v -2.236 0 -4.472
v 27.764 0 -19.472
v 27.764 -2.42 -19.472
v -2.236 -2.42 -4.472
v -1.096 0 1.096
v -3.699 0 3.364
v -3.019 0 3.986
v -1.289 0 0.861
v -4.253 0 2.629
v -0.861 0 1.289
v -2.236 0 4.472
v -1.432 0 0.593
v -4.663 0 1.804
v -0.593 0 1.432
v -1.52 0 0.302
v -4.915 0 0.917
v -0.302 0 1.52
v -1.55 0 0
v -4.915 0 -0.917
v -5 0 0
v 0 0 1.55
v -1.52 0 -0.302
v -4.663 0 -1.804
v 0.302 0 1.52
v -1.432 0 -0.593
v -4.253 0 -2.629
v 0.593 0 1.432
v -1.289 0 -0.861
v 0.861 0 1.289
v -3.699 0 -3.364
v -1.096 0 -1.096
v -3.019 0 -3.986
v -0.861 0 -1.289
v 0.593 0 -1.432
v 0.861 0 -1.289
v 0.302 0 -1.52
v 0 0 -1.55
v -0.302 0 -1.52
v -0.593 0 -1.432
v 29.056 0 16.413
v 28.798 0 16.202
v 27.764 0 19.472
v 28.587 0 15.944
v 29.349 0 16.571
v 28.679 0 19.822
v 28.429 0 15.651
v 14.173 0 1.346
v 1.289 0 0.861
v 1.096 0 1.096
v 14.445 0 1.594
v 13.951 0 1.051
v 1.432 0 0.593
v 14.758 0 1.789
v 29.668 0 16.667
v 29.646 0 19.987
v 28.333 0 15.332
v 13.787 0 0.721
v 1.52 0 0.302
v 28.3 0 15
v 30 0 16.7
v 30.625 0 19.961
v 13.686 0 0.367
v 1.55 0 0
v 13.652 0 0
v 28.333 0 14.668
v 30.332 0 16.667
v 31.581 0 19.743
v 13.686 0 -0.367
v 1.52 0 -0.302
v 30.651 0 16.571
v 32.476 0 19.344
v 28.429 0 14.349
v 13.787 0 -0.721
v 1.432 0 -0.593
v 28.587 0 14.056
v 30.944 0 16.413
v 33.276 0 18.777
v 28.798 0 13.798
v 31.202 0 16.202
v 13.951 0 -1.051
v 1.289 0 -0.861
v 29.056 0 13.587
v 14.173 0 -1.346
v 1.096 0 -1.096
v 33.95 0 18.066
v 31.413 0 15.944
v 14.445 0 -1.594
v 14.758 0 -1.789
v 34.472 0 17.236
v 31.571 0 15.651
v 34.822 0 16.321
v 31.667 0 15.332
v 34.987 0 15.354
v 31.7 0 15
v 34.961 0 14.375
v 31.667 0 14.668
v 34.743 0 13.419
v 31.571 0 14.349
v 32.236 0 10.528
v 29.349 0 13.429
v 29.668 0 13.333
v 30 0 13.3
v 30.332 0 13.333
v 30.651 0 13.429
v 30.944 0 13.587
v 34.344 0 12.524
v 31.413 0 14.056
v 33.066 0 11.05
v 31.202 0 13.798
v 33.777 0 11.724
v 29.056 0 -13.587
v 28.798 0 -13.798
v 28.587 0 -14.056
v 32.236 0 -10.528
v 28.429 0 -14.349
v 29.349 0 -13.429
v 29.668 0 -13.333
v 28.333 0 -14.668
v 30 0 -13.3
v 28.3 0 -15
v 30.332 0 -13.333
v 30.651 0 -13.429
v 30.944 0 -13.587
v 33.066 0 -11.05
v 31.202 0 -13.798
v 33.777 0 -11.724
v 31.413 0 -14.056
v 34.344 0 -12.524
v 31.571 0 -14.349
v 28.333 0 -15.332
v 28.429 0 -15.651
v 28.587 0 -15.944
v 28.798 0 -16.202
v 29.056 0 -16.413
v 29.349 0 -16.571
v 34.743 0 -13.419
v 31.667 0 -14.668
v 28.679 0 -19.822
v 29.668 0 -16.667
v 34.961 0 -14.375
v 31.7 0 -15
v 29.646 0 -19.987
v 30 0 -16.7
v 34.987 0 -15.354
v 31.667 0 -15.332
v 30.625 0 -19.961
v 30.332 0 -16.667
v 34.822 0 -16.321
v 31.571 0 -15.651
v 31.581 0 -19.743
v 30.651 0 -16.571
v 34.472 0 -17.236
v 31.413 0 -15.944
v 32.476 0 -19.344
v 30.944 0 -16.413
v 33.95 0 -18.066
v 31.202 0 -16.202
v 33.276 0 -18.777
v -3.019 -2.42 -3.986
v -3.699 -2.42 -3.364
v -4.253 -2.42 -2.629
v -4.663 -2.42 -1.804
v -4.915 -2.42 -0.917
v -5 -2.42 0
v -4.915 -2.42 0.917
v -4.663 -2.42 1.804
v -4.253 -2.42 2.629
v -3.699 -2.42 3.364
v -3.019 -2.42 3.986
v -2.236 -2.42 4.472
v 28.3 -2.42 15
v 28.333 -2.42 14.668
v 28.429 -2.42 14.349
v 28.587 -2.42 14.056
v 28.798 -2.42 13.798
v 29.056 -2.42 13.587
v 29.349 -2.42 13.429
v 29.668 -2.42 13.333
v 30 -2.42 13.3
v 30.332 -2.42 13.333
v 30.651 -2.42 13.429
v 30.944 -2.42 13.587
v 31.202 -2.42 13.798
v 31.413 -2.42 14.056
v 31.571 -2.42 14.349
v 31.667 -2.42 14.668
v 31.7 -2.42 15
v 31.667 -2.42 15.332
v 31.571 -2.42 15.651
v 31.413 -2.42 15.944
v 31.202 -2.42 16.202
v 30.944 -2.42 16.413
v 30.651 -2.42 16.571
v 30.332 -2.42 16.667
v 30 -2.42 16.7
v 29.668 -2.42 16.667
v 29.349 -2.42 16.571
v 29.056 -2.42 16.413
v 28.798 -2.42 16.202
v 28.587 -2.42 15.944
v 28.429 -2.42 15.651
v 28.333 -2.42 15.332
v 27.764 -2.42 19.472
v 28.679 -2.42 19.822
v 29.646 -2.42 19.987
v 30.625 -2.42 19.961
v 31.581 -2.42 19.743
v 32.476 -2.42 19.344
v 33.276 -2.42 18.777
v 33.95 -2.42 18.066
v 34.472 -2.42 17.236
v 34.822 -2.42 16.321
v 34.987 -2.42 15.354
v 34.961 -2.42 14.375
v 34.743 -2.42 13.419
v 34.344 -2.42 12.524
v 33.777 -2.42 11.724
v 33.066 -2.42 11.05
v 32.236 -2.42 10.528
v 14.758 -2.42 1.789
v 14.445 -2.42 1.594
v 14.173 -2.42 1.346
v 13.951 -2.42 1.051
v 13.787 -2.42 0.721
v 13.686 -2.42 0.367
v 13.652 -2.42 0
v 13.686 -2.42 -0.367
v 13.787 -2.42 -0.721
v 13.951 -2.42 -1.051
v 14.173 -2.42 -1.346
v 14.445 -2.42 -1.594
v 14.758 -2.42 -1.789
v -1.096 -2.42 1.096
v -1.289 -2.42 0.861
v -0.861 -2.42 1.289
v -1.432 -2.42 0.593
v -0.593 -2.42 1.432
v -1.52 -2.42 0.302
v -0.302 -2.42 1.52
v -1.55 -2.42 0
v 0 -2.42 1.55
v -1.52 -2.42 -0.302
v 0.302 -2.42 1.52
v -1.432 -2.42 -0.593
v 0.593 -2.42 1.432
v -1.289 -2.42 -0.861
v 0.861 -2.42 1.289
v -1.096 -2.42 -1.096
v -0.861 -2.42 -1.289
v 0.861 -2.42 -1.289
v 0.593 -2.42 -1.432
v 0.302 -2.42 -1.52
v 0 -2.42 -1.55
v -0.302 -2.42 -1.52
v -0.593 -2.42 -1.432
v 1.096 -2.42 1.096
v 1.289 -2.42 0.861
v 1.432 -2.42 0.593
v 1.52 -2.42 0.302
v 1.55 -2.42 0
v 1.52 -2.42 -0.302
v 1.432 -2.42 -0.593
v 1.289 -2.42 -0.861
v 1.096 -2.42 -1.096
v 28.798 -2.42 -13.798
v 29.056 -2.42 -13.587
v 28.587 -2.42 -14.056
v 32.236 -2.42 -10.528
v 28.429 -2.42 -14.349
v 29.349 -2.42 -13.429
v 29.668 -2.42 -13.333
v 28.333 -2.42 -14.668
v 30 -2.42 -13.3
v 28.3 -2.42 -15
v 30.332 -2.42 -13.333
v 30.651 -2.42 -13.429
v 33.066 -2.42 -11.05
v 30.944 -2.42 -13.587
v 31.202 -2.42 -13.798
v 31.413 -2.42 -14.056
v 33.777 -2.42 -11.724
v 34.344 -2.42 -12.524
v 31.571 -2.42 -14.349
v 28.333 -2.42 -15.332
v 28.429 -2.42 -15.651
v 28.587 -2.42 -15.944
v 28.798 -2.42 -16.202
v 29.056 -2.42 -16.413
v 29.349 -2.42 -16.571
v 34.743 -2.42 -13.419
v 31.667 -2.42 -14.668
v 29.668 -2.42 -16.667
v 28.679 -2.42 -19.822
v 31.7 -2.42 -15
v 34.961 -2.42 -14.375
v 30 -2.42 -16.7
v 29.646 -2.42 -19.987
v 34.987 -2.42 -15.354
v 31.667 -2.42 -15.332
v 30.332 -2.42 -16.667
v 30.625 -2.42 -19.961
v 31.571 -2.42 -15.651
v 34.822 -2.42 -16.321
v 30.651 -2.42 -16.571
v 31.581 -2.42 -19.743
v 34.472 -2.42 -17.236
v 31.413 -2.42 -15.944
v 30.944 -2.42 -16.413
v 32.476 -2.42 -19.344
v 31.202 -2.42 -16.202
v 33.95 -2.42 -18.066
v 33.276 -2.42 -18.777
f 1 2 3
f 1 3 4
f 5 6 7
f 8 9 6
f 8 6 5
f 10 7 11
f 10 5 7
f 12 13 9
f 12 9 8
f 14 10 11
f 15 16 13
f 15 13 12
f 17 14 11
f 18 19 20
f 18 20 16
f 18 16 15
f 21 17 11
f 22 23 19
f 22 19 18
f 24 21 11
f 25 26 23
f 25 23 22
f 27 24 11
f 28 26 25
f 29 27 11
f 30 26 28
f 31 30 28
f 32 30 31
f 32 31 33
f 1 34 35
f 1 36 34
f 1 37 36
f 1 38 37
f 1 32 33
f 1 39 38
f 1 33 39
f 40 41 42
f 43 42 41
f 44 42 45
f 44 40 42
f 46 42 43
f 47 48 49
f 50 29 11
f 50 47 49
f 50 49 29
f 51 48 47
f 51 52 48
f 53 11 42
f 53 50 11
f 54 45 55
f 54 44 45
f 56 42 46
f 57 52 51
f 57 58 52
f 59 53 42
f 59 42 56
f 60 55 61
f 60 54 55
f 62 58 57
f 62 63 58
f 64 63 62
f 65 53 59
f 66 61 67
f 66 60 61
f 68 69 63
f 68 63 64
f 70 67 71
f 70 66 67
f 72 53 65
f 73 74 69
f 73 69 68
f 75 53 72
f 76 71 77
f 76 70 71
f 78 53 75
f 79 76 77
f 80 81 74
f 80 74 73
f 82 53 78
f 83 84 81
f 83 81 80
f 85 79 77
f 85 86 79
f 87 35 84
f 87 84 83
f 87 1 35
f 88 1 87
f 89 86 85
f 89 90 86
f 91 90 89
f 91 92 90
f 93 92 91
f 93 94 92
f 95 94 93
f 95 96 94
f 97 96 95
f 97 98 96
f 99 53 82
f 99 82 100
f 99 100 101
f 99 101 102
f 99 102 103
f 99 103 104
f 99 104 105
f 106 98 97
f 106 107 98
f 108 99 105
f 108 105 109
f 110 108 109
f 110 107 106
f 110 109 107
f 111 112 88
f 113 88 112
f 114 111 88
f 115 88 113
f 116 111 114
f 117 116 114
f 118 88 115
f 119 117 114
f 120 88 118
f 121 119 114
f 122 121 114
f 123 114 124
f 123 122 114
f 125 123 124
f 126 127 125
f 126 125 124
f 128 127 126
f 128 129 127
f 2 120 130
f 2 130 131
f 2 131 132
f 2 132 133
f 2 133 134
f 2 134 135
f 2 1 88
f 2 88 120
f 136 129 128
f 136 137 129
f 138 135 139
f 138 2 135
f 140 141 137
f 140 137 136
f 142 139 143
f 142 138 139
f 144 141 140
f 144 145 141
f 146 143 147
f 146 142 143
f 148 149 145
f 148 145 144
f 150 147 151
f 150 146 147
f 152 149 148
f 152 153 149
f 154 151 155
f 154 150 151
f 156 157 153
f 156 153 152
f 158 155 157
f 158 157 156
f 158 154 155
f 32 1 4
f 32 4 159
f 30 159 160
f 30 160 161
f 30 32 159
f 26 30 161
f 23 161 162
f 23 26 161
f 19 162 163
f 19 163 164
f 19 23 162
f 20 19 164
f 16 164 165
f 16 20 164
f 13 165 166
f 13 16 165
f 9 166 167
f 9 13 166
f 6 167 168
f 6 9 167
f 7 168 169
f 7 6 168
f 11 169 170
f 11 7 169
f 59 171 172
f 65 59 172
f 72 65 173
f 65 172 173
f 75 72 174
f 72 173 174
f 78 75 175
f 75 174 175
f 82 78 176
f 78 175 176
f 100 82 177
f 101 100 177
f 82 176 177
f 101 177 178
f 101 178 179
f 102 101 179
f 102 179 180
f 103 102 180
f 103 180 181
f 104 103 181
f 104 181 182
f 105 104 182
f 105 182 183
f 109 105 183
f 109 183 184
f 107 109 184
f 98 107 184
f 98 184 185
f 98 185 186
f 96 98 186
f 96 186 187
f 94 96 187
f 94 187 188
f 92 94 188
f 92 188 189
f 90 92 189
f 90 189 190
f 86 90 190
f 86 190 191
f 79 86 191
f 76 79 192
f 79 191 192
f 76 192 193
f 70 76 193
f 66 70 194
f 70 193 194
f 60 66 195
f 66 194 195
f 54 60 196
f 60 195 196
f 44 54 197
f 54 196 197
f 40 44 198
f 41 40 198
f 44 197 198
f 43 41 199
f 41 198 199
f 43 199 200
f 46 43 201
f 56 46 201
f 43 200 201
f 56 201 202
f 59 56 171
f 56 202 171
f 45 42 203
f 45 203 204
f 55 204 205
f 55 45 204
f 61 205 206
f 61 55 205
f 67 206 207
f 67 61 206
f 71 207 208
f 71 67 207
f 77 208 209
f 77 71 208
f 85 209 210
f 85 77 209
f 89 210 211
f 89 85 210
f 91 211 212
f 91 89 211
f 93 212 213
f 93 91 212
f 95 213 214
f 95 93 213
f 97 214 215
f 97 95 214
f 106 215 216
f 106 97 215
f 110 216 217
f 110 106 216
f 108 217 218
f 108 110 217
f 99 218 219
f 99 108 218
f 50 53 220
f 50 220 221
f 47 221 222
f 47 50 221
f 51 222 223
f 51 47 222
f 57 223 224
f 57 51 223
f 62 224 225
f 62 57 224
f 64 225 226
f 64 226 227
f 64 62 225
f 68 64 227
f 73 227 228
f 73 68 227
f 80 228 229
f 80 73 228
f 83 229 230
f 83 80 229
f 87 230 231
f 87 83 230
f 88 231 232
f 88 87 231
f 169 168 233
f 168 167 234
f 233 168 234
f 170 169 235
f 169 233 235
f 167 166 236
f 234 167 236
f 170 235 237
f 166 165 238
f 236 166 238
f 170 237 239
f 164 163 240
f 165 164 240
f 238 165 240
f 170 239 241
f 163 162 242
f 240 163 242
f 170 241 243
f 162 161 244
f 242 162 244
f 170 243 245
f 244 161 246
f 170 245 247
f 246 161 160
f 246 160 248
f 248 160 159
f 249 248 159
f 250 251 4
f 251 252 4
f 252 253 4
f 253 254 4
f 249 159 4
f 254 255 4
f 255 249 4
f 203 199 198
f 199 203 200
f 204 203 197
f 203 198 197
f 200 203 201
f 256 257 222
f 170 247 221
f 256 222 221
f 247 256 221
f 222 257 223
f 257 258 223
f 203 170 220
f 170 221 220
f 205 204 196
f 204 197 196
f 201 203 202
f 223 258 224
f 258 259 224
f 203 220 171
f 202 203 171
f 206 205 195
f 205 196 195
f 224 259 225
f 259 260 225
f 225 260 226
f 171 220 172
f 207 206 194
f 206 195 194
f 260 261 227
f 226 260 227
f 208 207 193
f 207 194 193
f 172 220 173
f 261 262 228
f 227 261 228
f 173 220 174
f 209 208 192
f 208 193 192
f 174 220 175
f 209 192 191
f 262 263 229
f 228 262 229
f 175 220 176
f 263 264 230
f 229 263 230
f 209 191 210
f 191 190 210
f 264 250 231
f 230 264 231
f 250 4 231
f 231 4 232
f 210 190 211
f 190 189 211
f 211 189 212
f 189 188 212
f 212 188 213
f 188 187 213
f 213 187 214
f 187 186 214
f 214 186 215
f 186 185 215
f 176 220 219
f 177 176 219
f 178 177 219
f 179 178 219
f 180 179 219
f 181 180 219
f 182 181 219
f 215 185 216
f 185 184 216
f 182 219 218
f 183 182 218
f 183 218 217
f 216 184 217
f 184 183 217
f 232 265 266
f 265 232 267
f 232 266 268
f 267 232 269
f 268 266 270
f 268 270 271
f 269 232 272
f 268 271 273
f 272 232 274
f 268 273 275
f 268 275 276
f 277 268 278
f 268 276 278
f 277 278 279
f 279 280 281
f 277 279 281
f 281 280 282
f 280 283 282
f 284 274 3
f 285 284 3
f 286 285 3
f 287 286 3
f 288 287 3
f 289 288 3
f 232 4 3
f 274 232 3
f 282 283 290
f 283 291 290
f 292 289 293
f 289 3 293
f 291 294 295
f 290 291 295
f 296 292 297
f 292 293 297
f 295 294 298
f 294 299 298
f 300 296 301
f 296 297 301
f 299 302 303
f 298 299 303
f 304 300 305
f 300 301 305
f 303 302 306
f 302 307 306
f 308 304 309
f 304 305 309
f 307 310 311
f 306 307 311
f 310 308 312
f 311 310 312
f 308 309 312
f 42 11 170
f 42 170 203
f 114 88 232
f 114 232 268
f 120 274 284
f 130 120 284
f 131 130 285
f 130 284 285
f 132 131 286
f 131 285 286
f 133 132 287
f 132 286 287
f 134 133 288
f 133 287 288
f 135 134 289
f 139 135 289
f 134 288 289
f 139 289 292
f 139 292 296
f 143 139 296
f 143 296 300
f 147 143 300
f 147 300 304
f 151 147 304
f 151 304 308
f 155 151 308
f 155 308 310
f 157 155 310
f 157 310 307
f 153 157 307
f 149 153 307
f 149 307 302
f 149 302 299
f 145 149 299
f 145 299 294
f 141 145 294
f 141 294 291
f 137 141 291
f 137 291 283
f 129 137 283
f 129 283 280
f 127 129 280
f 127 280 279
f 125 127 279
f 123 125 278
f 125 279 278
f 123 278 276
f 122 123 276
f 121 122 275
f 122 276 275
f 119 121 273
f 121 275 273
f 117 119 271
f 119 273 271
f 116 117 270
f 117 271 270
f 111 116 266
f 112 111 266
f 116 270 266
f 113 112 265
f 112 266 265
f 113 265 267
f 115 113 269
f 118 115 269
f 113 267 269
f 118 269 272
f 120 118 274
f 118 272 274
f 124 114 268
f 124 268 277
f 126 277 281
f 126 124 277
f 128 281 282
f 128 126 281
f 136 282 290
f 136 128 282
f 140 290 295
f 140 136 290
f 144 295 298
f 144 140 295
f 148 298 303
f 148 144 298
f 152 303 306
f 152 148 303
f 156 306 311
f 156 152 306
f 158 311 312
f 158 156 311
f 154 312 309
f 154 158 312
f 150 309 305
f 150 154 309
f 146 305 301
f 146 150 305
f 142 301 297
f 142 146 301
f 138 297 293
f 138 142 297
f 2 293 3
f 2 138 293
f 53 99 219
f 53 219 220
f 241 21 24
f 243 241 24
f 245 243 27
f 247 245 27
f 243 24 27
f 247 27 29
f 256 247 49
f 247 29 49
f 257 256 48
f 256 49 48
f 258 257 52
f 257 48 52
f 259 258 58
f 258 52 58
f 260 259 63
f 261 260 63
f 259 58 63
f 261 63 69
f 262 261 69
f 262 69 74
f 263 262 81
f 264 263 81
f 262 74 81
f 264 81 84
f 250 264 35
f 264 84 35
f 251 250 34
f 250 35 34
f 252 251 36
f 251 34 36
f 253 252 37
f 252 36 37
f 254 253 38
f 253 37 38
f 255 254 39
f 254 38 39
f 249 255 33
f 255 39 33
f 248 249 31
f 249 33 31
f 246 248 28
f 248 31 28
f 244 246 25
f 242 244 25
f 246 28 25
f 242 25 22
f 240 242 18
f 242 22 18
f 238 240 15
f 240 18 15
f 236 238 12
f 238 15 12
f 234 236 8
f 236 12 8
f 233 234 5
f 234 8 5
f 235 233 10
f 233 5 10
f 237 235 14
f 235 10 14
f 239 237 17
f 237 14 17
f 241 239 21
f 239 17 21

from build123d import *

# Parameters (mm, degrees)
SKETCH8_R            = 1.55
BASE_FLANGE2_DEPTH   = 2.42
M3_CLEARANCE_HOLE3_D = 3.4


# Sheet-metal steps are written as plain solids
with BuildPart() as part:
    # Sketch8 → Base-Flange2 (new body)
    with BuildSketch(Plane(origin=(0, 0, 0), x_dir=(1, 0, 0), z_dir=(0, 1, 0))):
        with BuildLine():
            Line((27.763932023, 19.472135955), (-2.236067977, 4.472135955))
            ThreePointArc((-2.236067977, 4.472135955), (-5, 0), (-2.236067977, -4.472135955))
            Line((-2.236067977, -4.472135955), (27.763932023, -19.472135955))
            ThreePointArc((27.763932023, -19.472135955), (34.472135955, -17.236067977), (32.236067977, -10.527864045))
            Line((32.236067977, -10.527864045), (14.758048651, -1.788854382))
            ThreePointArc((14.758048651, -1.788854382), (13.652475842, 0), (14.758048651, 1.788854382))
            Line((14.758048651, 1.788854382), (32.236067977, 10.527864045))
            ThreePointArc((32.236067977, 10.527864045), (34.472135955, 17.236067977), (27.763932023, 19.472135955))
        make_face()
        with Locations(Location((0, 0, 0), (0, 0, 270))):
            Circle(SKETCH8_R, mode=Mode.SUBTRACT)
    extrude(amount=-BASE_FLANGE2_DEPTH)

    # M3 Clearance Hole3 (through all)
    with Locations(Plane(origin=(0, 0, 0), x_dir=(1, 0, 0), z_dir=(0, 1, 0))):
        with Locations((30, 15), (30, -15)):
            Hole(M3_CLEARANCE_HOLE3_D / 2)


solid = part.part
